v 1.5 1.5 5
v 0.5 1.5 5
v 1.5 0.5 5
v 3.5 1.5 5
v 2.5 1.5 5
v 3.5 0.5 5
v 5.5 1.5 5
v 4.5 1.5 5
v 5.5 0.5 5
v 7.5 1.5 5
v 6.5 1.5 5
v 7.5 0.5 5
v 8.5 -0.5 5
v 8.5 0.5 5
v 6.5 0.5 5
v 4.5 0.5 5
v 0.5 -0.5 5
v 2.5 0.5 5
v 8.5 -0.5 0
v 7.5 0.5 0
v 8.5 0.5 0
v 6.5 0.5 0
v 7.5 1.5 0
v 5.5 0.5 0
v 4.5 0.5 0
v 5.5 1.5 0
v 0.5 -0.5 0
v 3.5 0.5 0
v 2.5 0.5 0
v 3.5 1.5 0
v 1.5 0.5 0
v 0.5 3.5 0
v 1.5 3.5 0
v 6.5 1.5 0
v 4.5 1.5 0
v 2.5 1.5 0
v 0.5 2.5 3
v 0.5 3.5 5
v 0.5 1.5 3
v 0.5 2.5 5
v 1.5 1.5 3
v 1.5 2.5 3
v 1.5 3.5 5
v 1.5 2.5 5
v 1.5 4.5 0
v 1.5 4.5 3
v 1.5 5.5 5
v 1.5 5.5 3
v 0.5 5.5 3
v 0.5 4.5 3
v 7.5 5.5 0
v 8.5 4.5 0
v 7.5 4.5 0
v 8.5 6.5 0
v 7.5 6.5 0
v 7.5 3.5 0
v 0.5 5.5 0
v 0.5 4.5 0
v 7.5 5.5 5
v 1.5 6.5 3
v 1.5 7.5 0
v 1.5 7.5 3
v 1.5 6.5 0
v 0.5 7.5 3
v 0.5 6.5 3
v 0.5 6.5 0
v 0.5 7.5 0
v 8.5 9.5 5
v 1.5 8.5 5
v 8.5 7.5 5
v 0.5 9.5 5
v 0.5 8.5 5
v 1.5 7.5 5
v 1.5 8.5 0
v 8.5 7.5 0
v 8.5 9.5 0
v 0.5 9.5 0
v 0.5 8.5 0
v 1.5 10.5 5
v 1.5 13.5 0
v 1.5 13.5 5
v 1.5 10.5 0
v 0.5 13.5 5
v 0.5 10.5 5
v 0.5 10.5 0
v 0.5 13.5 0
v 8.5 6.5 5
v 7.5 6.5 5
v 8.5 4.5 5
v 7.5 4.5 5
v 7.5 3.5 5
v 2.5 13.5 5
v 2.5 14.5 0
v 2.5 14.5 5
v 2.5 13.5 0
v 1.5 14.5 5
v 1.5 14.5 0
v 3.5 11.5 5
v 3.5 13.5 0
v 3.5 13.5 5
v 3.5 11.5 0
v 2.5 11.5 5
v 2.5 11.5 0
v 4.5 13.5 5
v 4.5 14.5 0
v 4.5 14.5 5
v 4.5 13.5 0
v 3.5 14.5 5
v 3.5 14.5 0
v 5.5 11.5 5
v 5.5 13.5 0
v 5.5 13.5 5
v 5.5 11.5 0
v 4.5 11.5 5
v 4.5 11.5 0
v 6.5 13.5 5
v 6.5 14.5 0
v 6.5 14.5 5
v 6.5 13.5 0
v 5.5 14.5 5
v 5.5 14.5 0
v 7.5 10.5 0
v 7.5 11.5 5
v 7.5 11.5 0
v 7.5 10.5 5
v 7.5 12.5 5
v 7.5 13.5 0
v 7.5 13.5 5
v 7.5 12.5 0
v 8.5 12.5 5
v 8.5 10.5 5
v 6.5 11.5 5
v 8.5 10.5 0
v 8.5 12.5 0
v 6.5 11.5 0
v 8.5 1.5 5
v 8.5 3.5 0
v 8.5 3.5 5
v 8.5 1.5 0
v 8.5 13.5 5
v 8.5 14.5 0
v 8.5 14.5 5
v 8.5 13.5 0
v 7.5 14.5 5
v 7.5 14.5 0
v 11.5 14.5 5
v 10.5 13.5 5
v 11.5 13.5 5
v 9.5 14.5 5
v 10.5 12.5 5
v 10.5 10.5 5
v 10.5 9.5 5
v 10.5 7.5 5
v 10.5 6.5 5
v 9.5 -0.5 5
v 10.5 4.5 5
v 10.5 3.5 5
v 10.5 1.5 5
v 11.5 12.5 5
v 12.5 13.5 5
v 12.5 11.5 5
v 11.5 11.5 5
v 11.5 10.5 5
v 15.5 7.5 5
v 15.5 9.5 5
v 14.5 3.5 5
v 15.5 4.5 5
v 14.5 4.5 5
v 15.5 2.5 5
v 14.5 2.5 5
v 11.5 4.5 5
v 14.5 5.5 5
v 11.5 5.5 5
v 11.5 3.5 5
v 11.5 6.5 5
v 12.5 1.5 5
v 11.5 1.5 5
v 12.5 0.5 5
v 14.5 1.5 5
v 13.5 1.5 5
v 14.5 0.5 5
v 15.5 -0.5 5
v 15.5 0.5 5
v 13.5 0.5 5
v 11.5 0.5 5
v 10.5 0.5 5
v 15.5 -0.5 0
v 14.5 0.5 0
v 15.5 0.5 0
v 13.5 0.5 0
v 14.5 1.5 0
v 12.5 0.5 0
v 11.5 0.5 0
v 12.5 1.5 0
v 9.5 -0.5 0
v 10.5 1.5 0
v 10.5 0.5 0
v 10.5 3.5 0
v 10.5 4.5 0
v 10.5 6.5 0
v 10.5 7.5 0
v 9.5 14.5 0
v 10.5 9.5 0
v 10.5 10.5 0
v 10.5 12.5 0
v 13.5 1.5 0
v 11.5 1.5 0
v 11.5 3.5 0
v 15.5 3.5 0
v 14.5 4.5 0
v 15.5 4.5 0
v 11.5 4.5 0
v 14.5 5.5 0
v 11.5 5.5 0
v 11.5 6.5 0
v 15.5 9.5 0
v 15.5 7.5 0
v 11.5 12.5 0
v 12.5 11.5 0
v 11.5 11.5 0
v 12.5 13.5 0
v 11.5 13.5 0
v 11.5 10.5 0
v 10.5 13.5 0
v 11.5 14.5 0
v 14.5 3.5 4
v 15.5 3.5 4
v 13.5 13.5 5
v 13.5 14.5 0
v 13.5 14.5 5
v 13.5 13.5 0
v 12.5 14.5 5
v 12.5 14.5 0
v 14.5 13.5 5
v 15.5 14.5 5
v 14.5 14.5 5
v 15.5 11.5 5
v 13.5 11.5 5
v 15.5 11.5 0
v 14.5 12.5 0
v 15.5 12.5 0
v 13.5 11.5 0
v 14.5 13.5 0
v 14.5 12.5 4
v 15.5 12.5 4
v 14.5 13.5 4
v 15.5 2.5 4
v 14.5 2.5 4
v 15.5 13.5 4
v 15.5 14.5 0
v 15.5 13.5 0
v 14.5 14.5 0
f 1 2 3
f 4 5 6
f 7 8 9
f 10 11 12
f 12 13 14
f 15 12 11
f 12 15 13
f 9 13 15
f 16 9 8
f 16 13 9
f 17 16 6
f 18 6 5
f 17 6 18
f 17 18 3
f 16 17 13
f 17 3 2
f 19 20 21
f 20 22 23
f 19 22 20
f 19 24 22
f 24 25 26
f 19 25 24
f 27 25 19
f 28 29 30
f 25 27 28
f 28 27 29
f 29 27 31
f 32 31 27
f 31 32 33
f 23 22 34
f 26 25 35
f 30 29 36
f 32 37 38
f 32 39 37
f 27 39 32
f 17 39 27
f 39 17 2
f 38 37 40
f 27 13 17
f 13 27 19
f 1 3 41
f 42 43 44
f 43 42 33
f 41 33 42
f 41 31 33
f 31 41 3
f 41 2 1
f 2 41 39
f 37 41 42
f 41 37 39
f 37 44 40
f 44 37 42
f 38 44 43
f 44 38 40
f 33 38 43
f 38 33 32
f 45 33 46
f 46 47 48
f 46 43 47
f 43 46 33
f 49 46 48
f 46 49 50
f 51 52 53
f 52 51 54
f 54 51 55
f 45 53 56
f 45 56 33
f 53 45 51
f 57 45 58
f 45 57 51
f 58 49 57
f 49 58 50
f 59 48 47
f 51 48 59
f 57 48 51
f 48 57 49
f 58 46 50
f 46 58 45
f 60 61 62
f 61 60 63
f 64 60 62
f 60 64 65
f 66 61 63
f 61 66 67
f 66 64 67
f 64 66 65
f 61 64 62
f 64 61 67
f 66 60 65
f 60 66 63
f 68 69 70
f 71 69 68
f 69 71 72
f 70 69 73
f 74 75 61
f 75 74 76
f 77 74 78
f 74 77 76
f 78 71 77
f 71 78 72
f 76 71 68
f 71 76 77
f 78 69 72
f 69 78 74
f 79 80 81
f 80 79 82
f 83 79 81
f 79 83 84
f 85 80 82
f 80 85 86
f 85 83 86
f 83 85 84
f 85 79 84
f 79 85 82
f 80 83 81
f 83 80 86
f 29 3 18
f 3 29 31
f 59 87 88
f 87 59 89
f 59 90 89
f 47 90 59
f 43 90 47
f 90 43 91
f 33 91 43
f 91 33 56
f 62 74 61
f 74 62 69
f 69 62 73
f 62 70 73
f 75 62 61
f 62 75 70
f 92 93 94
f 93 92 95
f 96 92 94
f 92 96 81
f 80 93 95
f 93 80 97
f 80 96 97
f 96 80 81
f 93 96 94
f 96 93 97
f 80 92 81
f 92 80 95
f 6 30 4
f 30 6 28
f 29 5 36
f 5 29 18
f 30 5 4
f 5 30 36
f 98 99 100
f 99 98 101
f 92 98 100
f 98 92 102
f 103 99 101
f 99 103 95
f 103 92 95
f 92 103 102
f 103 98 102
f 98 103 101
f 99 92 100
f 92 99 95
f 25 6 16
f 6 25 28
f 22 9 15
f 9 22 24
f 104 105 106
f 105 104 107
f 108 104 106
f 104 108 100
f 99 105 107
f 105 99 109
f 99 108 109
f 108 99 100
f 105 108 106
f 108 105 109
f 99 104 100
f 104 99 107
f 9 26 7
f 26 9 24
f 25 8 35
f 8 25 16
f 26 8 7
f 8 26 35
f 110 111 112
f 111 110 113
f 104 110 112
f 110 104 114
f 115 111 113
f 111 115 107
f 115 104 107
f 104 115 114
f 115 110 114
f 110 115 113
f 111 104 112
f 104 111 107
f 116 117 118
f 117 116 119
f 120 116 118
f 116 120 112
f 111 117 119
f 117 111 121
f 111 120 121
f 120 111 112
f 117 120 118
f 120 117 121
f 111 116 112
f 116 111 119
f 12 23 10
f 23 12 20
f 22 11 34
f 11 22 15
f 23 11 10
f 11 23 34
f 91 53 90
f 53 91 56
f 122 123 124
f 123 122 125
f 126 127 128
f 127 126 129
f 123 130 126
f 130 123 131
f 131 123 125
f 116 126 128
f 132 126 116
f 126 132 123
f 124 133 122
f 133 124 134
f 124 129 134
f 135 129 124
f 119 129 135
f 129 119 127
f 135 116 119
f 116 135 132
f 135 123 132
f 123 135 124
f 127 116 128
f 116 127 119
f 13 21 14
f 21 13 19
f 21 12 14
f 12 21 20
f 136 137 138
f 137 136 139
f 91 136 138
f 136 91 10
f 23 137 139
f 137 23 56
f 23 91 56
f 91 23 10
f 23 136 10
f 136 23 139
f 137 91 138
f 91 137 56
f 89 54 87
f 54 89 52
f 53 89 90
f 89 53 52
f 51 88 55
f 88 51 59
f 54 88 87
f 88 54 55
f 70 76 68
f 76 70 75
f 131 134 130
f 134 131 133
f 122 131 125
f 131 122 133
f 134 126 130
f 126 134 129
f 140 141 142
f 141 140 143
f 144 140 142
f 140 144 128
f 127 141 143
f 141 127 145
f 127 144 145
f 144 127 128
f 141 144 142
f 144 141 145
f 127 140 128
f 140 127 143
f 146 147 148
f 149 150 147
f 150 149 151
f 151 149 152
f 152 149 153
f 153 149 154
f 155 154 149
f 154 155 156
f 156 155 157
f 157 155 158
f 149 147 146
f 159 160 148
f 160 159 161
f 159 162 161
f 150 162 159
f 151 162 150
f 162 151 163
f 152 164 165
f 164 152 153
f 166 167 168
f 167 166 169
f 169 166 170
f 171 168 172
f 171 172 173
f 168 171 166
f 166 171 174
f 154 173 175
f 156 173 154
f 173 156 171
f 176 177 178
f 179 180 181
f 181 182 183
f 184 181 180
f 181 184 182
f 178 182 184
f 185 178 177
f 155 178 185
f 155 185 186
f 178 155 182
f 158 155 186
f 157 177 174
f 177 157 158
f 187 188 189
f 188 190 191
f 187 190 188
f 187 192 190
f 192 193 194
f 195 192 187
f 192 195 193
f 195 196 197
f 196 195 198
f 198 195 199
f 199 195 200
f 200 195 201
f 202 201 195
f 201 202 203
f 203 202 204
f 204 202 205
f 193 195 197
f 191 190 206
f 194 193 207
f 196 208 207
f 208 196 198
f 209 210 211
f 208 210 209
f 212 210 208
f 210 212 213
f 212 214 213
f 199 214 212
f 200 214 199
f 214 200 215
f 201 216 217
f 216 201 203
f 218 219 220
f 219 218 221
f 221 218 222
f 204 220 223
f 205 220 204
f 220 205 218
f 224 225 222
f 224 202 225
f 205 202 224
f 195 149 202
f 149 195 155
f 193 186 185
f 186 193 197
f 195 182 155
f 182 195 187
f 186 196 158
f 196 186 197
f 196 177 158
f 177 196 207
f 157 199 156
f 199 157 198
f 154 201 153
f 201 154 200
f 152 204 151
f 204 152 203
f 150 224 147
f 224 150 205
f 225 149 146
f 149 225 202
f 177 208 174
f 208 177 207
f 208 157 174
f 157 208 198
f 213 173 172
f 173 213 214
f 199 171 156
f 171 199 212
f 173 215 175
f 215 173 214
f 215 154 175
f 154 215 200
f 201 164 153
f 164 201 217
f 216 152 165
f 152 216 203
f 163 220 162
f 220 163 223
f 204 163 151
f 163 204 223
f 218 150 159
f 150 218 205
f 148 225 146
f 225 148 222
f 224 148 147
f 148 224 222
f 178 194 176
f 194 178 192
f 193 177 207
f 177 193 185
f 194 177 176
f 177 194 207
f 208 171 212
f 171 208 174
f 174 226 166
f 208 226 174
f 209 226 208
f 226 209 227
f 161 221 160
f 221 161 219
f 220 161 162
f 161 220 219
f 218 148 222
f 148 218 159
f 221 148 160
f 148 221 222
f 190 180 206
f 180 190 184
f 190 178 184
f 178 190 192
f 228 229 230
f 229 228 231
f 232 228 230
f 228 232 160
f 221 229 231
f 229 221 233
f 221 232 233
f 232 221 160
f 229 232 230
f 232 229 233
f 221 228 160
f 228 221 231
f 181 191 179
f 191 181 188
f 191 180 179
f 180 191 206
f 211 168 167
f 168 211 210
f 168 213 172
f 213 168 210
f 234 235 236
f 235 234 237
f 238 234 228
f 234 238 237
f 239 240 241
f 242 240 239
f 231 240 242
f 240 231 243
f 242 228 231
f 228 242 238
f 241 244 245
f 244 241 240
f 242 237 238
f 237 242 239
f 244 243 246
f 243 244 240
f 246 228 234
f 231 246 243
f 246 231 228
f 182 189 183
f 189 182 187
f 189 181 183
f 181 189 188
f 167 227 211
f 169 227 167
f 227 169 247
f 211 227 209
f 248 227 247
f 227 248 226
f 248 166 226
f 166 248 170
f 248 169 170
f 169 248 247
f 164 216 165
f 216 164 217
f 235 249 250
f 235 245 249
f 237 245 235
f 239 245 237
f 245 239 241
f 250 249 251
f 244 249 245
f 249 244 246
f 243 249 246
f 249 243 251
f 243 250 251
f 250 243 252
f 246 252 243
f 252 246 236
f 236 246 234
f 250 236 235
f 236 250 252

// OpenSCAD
union() {
    translate([1, 0, 2.5]) cube([1, 1, 5], center=true);
    translate([1, 1, 2.5]) cube([1, 1, 5], center=true);
    translate([1, 2, 1.5]) cube([1, 1, 3], center=true);
    translate([1, 3, 2.5]) cube([1, 1, 5], center=true);
    translate([1, 5, 1.5]) cube([1, 1, 3], center=true);
    translate([1, 7, 1.5]) cube([1, 1, 3], center=true);
    translate([1, 9, 2.5]) cube([1, 1, 5], center=true);
    translate([1, 11, 2.5]) cube([1, 1, 5], center=true);
    translate([1, 12, 2.5]) cube([1, 1, 5], center=true);
    translate([1, 13, 2.5]) cube([1, 1, 5], center=true);
    translate([2, 0, 2.5]) cube([1, 1, 5], center=true);
    translate([2, 4, 2.5]) cube([1, 1, 5], center=true);
    translate([2, 5, 2.5]) cube([1, 1, 5], center=true);
    translate([2, 8, 2.5]) cube([1, 1, 5], center=true);
    translate([2, 9, 2.5]) cube([1, 1, 5], center=true);
    translate([2, 14, 2.5]) cube([1, 1, 5], center=true);
    translate([3, 0, 2.5]) cube([1, 1, 5], center=true);
    translate([3, 1, 2.5]) cube([1, 1, 5], center=true);
    translate([3, 4, 2.5]) cube([1, 1, 5], center=true);
    translate([3, 5, 2.5]) cube([1, 1, 5], center=true);
    translate([3, 8, 2.5]) cube([1, 1, 5], center=true);
    translate([3, 9, 2.5]) cube([1, 1, 5], center=true);
    translate([3, 12, 2.5]) cube([1, 1, 5], center=true);
    translate([3, 13, 2.5]) cube([1, 1, 5], center=true);
    translate([4, 0, 2.5]) cube([1, 1, 5], center=true);
    translate([4, 4, 2.5]) cube([1, 1, 5], center=true);
    translate([4, 5, 2.5]) cube([1, 1, 5], center=true);
    translate([4, 8, 2.5]) cube([1, 1, 5], center=true);
    translate([4, 9, 2.5]) cube([1, 1, 5], center=true);
    translate([4, 14, 2.5]) cube([1, 1, 5], center=true);
    translate([5, 0, 2.5]) cube([1, 1, 5], center=true);
    translate([5, 1, 2.5]) cube([1, 1, 5], center=true);
    translate([5, 4, 2.5]) cube([1, 1, 5], center=true);
    translate([5, 5, 2.5]) cube([1, 1, 5], center=true);
    translate([5, 8, 2.5]) cube([1, 1, 5], center=true);
    translate([5, 9, 2.5]) cube([1, 1, 5], center=true);
    translate([5, 12, 2.5]) cube([1, 1, 5], center=true);
    translate([5, 13, 2.5]) cube([1, 1, 5], center=true);
    translate([6, 0, 2.5]) cube([1, 1, 5], center=true);
    translate([6, 4, 2.5]) cube([1, 1, 5], center=true);
    translate([6, 5, 2.5]) cube([1, 1, 5], center=true);
    translate([6, 8, 2.5]) cube([1, 1, 5], center=true);
    translate([6, 9, 2.5]) cube([1, 1, 5], center=true);
    translate([6, 14, 2.5]) cube([1, 1, 5], center=true);
    translate([7, 0, 2.5]) cube([1, 1, 5], center=true);
    translate([7, 1, 2.5]) cube([1, 1, 5], center=true);
    translate([7, 4, 2.5]) cube([1, 1, 5], center=true);
    translate([7, 5, 2.5]) cube([1, 1, 5], center=true);
    translate([7, 8, 2.5]) cube([1, 1, 5], center=true);
    translate([7, 9, 2.5]) cube([1, 1, 5], center=true);
    translate([7, 12, 2.5]) cube([1, 1, 5], center=true);
    translate([7, 13, 2.5]) cube([1, 1, 5], center=true);
    translate([8, 0, 2.5]) cube([1, 1, 5], center=true);
    translate([8, 2, 2.5]) cube([1, 1, 5], center=true);
    translate([8, 3, 2.5]) cube([1, 1, 5], center=true);
    translate([8, 5, 2.5]) cube([1, 1, 5], center=true);
    translate([8, 6, 2.5]) cube([1, 1, 5], center=true);
    translate([8, 8, 2.5]) cube([1, 1, 5], center=true);
    translate([8, 9, 2.5]) cube([1, 1, 5], center=true);
    translate([8, 11, 2.5]) cube([1, 1, 5], center=true);
    translate([8, 12, 2.5]) cube([1, 1, 5], center=true);
    translate([8, 14, 2.5]) cube([1, 1, 5], center=true);
    translate([10, 0, 2.5]) cube([1, 1, 5], center=true);
    translate([10, 1, 2.5]) cube([1, 1, 5], center=true);
    translate([10, 2, 2.5]) cube([1, 1, 5], center=true);
    translate([10, 3, 2.5]) cube([1, 1, 5], center=true);
    translate([10, 4, 2.5]) cube([1, 1, 5], center=true);
    translate([10, 5, 2.5]) cube([1, 1, 5], center=true);
    translate([10, 6, 2.5]) cube([1, 1, 5], center=true);
    translate([10, 7, 2.5]) cube([1, 1, 5], center=true);
    translate([10, 8, 2.5]) cube([1, 1, 5], center=true);
    translate([10, 9, 2.5]) cube([1, 1, 5], center=true);
    translate([10, 10, 2.5]) cube([1, 1, 5], center=true);
    translate([10, 11, 2.5]) cube([1, 1, 5], center=true);
    translate([10, 12, 2.5]) cube([1, 1, 5], center=true);
    translate([10, 13, 2.5]) cube([1, 1, 5], center=true);
    translate([10, 14, 2.5]) cube([1, 1, 5], center=true);
    translate([11, 0, 2.5]) cube([1, 1, 5], center=true);
    translate([11, 2, 2.5]) cube([1, 1, 5], center=true);
    translate([11, 3, 2.5]) cube([1, 1, 5], center=true);
    translate([11, 5, 2.5]) cube([1, 1, 5], center=true);
    translate([11, 6, 2.5]) cube([1, 1, 5], center=true);
    translate([11, 8, 2.5]) cube([1, 1, 5], center=true);
    translate([11, 9, 2.5]) cube([1, 1, 5], center=true);
    translate([11, 11, 2.5]) cube([1, 1, 5], center=true);
    translate([11, 12, 2.5]) cube([1, 1, 5], center=true);
    translate([11, 14, 2.5]) cube([1, 1, 5], center=true);
    translate([12, 0, 2.5]) cube([1, 1, 5], center=true);
    translate([12, 1, 2.5]) cube([1, 1, 5], center=true);
    translate([12, 4, 2.5]) cube([1, 1, 5], center=true);
    translate([12, 5, 2.5]) cube([1, 1, 5], center=true);
    translate([12, 8, 2.5]) cube([1, 1, 5], center=true);
    translate([12, 9, 2.5]) cube([1, 1, 5], center=true);
    translate([12, 12, 2.5]) cube([1, 1, 5], center=true);
    translate([12, 13, 2.5]) cube([1, 1, 5], center=true);
    translate([13, 0, 2.5]) cube([1, 1, 5], center=true);
    translate([13, 4, 2.5]) cube([1, 1, 5], center=true);
    translate([13, 5, 2.5]) cube([1, 1, 5], center=true);
    translate([13, 8, 2.5]) cube([1, 1, 5], center=true);
    translate([13, 9, 2.5]) cube([1, 1, 5], center=true);
    translate([13, 14, 2.5]) cube([1, 1, 5], center=true);
    translate([14, 0, 2.5]) cube([1, 1, 5], center=true);
    translate([14, 1, 2.5]) cube([1, 1, 5], center=true);
    translate([14, 4, 2.5]) cube([1, 1, 5], center=true);
    translate([14, 5, 2.5]) cube([1, 1, 5], center=true);
    translate([14, 8, 2.5]) cube([1, 1, 5], center=true);
    translate([14, 9, 2.5]) cube([1, 1, 5], center=true);
    translate([14, 12, 2.5]) cube([1, 1, 5], center=true);
    translate([14, 13, 2.5]) cube([1, 1, 5], center=true);
    translate([15, 0, 2.5]) cube([1, 1, 5], center=true);
    translate([15, 3, 4.5]) color([1, 0, 0]) cube([1, 1, 1], center=true);
    translate([15, 4, 2.5]) cube([1, 1, 5], center=true);
    translate([15, 8, 2.5]) cube([1, 1, 5], center=true);
    translate([15, 9, 2.5]) cube([1, 1, 5], center=true);
    translate([15, 12, 2.5]) cube([1, 1, 5], center=true);
    translate([15, 13, 4.5]) color([0, 0, 1]) cube([1, 1, 1], center=true);
    translate([15, 14, 2.5]) cube([1, 1, 5], center=true);
}
